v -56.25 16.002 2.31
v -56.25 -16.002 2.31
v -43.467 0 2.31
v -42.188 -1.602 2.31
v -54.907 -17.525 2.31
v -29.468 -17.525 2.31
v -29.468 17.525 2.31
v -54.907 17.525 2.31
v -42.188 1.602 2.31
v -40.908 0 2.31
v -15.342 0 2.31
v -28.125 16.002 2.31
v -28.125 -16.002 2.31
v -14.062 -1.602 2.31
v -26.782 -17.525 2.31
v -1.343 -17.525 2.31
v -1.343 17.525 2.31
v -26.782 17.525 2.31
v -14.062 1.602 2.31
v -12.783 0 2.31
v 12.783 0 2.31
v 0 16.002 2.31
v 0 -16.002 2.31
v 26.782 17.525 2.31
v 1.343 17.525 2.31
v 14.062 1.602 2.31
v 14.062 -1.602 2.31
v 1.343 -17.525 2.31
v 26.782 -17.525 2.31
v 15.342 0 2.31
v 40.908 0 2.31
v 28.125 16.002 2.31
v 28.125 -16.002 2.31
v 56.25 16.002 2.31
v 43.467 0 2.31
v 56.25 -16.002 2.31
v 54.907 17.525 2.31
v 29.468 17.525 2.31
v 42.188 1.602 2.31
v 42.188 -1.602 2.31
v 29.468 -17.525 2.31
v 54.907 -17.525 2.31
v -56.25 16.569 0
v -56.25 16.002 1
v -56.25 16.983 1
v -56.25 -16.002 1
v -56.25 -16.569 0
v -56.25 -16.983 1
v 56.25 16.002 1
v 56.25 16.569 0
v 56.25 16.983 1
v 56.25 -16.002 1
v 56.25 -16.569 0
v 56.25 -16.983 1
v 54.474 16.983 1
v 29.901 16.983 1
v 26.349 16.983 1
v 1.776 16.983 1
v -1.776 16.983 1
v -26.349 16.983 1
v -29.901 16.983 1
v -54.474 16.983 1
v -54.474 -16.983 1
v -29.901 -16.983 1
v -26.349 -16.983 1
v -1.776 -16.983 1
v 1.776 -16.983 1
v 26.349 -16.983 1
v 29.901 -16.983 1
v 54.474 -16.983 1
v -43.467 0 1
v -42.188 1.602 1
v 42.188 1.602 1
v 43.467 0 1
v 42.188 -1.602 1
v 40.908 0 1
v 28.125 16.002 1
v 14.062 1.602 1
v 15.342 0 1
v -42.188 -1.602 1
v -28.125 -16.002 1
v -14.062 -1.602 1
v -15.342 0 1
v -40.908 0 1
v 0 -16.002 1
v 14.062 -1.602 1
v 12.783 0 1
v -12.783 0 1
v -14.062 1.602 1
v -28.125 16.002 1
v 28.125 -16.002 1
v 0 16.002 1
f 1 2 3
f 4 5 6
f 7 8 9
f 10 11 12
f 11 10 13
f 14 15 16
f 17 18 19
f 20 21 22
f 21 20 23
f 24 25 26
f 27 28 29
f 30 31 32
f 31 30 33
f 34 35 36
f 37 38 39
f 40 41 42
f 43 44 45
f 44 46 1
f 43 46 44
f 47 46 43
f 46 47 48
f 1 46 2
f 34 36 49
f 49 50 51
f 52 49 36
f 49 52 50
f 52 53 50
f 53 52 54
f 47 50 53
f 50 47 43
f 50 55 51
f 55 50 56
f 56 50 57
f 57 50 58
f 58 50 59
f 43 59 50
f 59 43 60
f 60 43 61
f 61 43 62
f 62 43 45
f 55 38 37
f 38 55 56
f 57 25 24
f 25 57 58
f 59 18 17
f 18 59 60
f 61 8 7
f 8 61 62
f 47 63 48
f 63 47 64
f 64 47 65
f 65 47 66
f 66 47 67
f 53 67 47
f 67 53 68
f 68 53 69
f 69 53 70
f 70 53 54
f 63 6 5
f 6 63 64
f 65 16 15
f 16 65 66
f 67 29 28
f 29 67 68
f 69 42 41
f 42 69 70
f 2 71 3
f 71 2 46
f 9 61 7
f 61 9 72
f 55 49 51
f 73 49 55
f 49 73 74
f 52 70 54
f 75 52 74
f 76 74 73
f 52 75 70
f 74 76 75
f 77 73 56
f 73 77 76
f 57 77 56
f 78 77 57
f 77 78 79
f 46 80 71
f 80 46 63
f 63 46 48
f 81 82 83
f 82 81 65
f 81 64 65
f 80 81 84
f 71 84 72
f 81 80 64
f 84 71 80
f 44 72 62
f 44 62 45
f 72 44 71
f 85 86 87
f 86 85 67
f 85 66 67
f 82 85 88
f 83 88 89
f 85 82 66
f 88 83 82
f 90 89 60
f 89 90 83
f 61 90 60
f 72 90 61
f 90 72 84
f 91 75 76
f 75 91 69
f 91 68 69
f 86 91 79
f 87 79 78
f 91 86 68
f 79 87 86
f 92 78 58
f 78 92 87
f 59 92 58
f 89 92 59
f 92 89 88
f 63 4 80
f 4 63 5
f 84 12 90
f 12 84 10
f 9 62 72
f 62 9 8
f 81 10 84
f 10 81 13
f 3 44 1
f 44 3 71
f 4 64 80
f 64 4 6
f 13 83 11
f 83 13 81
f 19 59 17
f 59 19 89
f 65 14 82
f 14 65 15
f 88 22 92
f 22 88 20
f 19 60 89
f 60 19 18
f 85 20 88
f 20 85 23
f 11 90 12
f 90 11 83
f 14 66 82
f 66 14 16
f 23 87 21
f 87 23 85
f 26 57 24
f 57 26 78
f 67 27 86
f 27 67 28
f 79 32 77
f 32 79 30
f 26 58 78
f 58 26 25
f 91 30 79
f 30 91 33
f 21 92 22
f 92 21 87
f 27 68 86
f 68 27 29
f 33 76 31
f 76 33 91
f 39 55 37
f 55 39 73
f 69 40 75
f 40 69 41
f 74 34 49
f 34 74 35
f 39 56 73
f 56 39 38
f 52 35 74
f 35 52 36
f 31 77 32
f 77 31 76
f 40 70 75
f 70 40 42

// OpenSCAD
// Paneled cache pot diamond panel.

// ---------- Public parameters (mm) ----------
inside_radius = 75 / 2;
inside_height = 110;
min_wall_thickness = 2.5;
bottom_thickness = 2.5;
bottom_edge_width = 10;
num_panels = 8;
panel_thickness = 2.5;
groove_depth = 1.5;
groove_width = 2.0;

// ---------- Resolution ----------
$fa = 1;
$fs = 1;

// ---------- Derived ----------
outside_height = inside_height + bottom_thickness;
outside_radius = (inside_radius + min_wall_thickness) / cos(180 / num_panels);
panel_extra_radius = panel_thickness / cos(180 / num_panels);
panel_width = (outside_radius + panel_extra_radius) * 2 * sin(180/num_panels);

module outside_cylinder() {
  cylinder(outside_height, outside_radius, outside_radius, $fn = num_panels);
}

module inside_cutout() {
  translate([0, 0, bottom_thickness])
    cylinder(inside_height + 1, inside_radius, inside_radius);
  translate([0, 0, -0.5 * bottom_thickness])
    cylinder(2 * bottom_thickness, inside_radius - bottom_edge_width, inside_radius - bottom_edge_width);
}

module core() {
  difference() {
    outside_cylinder();
    inside_cutout();
  }
}

module panel() {
  difference() {
    cylinder(outside_height, outside_radius + panel_thickness, outside_radius + panel_thickness, $fn = num_panels);
    translate([0, 0, -1])
      cylinder(outside_height + 2, outside_radius, outside_radius, $fn = num_panels);
    translate([-(outside_radius + panel_thickness + 1), 0, -1])
      cube([2 * (outside_radius + panel_thickness + 1), 2 * (outside_radius + panel_thickness + 1), outside_height + 2]);
    rotate([0, 0, 180 - 360 / num_panels])
      translate([-(outside_radius + panel_thickness + 1), 0, -1])
        cube([2 * (outside_radius + panel_thickness + 1), 2 * (outside_radius + panel_thickness + 1), outside_height + 2]);
  }
}

module panel_flat_on_bed() {
  translate([outside_height / 2, 0, -(inside_radius + min_wall_thickness)])
    rotate([0, -90, 0])
      rotate([0, 0, 180 / num_panels])
        panel();
}

module panel_groove() {
    groove_x = outside_height / 4;
    groove_y = panel_width;
    groove_angle = atan(groove_y / groove_x);
    translate([0, 0, panel_thickness * 1.5 - groove_depth]) rotate([0, 0, groove_angle]) cube([outside_height, groove_width, panel_thickness], center=true);
    translate([0, 0, panel_thickness * 1.5 - groove_depth]) rotate([0, 0, -groove_angle]) cube([outside_height, groove_width, panel_thickness], center=true);
}

module grooved_panel() {
    groove_x = outside_height / 4;
    difference() {
        panel_flat_on_bed();
        translate([-1.5 * groove_x, 0, 0]) panel_groove();
        translate([-0.5 * groove_x, 0, 0]) panel_groove();
        translate([0.5 * groove_x, 0, 0]) panel_groove();
        translate([1.5 * groove_x, 0, 0]) panel_groove();
    }
}

grooved_panel();
//color("red") panel();
//color("yellow") core();
